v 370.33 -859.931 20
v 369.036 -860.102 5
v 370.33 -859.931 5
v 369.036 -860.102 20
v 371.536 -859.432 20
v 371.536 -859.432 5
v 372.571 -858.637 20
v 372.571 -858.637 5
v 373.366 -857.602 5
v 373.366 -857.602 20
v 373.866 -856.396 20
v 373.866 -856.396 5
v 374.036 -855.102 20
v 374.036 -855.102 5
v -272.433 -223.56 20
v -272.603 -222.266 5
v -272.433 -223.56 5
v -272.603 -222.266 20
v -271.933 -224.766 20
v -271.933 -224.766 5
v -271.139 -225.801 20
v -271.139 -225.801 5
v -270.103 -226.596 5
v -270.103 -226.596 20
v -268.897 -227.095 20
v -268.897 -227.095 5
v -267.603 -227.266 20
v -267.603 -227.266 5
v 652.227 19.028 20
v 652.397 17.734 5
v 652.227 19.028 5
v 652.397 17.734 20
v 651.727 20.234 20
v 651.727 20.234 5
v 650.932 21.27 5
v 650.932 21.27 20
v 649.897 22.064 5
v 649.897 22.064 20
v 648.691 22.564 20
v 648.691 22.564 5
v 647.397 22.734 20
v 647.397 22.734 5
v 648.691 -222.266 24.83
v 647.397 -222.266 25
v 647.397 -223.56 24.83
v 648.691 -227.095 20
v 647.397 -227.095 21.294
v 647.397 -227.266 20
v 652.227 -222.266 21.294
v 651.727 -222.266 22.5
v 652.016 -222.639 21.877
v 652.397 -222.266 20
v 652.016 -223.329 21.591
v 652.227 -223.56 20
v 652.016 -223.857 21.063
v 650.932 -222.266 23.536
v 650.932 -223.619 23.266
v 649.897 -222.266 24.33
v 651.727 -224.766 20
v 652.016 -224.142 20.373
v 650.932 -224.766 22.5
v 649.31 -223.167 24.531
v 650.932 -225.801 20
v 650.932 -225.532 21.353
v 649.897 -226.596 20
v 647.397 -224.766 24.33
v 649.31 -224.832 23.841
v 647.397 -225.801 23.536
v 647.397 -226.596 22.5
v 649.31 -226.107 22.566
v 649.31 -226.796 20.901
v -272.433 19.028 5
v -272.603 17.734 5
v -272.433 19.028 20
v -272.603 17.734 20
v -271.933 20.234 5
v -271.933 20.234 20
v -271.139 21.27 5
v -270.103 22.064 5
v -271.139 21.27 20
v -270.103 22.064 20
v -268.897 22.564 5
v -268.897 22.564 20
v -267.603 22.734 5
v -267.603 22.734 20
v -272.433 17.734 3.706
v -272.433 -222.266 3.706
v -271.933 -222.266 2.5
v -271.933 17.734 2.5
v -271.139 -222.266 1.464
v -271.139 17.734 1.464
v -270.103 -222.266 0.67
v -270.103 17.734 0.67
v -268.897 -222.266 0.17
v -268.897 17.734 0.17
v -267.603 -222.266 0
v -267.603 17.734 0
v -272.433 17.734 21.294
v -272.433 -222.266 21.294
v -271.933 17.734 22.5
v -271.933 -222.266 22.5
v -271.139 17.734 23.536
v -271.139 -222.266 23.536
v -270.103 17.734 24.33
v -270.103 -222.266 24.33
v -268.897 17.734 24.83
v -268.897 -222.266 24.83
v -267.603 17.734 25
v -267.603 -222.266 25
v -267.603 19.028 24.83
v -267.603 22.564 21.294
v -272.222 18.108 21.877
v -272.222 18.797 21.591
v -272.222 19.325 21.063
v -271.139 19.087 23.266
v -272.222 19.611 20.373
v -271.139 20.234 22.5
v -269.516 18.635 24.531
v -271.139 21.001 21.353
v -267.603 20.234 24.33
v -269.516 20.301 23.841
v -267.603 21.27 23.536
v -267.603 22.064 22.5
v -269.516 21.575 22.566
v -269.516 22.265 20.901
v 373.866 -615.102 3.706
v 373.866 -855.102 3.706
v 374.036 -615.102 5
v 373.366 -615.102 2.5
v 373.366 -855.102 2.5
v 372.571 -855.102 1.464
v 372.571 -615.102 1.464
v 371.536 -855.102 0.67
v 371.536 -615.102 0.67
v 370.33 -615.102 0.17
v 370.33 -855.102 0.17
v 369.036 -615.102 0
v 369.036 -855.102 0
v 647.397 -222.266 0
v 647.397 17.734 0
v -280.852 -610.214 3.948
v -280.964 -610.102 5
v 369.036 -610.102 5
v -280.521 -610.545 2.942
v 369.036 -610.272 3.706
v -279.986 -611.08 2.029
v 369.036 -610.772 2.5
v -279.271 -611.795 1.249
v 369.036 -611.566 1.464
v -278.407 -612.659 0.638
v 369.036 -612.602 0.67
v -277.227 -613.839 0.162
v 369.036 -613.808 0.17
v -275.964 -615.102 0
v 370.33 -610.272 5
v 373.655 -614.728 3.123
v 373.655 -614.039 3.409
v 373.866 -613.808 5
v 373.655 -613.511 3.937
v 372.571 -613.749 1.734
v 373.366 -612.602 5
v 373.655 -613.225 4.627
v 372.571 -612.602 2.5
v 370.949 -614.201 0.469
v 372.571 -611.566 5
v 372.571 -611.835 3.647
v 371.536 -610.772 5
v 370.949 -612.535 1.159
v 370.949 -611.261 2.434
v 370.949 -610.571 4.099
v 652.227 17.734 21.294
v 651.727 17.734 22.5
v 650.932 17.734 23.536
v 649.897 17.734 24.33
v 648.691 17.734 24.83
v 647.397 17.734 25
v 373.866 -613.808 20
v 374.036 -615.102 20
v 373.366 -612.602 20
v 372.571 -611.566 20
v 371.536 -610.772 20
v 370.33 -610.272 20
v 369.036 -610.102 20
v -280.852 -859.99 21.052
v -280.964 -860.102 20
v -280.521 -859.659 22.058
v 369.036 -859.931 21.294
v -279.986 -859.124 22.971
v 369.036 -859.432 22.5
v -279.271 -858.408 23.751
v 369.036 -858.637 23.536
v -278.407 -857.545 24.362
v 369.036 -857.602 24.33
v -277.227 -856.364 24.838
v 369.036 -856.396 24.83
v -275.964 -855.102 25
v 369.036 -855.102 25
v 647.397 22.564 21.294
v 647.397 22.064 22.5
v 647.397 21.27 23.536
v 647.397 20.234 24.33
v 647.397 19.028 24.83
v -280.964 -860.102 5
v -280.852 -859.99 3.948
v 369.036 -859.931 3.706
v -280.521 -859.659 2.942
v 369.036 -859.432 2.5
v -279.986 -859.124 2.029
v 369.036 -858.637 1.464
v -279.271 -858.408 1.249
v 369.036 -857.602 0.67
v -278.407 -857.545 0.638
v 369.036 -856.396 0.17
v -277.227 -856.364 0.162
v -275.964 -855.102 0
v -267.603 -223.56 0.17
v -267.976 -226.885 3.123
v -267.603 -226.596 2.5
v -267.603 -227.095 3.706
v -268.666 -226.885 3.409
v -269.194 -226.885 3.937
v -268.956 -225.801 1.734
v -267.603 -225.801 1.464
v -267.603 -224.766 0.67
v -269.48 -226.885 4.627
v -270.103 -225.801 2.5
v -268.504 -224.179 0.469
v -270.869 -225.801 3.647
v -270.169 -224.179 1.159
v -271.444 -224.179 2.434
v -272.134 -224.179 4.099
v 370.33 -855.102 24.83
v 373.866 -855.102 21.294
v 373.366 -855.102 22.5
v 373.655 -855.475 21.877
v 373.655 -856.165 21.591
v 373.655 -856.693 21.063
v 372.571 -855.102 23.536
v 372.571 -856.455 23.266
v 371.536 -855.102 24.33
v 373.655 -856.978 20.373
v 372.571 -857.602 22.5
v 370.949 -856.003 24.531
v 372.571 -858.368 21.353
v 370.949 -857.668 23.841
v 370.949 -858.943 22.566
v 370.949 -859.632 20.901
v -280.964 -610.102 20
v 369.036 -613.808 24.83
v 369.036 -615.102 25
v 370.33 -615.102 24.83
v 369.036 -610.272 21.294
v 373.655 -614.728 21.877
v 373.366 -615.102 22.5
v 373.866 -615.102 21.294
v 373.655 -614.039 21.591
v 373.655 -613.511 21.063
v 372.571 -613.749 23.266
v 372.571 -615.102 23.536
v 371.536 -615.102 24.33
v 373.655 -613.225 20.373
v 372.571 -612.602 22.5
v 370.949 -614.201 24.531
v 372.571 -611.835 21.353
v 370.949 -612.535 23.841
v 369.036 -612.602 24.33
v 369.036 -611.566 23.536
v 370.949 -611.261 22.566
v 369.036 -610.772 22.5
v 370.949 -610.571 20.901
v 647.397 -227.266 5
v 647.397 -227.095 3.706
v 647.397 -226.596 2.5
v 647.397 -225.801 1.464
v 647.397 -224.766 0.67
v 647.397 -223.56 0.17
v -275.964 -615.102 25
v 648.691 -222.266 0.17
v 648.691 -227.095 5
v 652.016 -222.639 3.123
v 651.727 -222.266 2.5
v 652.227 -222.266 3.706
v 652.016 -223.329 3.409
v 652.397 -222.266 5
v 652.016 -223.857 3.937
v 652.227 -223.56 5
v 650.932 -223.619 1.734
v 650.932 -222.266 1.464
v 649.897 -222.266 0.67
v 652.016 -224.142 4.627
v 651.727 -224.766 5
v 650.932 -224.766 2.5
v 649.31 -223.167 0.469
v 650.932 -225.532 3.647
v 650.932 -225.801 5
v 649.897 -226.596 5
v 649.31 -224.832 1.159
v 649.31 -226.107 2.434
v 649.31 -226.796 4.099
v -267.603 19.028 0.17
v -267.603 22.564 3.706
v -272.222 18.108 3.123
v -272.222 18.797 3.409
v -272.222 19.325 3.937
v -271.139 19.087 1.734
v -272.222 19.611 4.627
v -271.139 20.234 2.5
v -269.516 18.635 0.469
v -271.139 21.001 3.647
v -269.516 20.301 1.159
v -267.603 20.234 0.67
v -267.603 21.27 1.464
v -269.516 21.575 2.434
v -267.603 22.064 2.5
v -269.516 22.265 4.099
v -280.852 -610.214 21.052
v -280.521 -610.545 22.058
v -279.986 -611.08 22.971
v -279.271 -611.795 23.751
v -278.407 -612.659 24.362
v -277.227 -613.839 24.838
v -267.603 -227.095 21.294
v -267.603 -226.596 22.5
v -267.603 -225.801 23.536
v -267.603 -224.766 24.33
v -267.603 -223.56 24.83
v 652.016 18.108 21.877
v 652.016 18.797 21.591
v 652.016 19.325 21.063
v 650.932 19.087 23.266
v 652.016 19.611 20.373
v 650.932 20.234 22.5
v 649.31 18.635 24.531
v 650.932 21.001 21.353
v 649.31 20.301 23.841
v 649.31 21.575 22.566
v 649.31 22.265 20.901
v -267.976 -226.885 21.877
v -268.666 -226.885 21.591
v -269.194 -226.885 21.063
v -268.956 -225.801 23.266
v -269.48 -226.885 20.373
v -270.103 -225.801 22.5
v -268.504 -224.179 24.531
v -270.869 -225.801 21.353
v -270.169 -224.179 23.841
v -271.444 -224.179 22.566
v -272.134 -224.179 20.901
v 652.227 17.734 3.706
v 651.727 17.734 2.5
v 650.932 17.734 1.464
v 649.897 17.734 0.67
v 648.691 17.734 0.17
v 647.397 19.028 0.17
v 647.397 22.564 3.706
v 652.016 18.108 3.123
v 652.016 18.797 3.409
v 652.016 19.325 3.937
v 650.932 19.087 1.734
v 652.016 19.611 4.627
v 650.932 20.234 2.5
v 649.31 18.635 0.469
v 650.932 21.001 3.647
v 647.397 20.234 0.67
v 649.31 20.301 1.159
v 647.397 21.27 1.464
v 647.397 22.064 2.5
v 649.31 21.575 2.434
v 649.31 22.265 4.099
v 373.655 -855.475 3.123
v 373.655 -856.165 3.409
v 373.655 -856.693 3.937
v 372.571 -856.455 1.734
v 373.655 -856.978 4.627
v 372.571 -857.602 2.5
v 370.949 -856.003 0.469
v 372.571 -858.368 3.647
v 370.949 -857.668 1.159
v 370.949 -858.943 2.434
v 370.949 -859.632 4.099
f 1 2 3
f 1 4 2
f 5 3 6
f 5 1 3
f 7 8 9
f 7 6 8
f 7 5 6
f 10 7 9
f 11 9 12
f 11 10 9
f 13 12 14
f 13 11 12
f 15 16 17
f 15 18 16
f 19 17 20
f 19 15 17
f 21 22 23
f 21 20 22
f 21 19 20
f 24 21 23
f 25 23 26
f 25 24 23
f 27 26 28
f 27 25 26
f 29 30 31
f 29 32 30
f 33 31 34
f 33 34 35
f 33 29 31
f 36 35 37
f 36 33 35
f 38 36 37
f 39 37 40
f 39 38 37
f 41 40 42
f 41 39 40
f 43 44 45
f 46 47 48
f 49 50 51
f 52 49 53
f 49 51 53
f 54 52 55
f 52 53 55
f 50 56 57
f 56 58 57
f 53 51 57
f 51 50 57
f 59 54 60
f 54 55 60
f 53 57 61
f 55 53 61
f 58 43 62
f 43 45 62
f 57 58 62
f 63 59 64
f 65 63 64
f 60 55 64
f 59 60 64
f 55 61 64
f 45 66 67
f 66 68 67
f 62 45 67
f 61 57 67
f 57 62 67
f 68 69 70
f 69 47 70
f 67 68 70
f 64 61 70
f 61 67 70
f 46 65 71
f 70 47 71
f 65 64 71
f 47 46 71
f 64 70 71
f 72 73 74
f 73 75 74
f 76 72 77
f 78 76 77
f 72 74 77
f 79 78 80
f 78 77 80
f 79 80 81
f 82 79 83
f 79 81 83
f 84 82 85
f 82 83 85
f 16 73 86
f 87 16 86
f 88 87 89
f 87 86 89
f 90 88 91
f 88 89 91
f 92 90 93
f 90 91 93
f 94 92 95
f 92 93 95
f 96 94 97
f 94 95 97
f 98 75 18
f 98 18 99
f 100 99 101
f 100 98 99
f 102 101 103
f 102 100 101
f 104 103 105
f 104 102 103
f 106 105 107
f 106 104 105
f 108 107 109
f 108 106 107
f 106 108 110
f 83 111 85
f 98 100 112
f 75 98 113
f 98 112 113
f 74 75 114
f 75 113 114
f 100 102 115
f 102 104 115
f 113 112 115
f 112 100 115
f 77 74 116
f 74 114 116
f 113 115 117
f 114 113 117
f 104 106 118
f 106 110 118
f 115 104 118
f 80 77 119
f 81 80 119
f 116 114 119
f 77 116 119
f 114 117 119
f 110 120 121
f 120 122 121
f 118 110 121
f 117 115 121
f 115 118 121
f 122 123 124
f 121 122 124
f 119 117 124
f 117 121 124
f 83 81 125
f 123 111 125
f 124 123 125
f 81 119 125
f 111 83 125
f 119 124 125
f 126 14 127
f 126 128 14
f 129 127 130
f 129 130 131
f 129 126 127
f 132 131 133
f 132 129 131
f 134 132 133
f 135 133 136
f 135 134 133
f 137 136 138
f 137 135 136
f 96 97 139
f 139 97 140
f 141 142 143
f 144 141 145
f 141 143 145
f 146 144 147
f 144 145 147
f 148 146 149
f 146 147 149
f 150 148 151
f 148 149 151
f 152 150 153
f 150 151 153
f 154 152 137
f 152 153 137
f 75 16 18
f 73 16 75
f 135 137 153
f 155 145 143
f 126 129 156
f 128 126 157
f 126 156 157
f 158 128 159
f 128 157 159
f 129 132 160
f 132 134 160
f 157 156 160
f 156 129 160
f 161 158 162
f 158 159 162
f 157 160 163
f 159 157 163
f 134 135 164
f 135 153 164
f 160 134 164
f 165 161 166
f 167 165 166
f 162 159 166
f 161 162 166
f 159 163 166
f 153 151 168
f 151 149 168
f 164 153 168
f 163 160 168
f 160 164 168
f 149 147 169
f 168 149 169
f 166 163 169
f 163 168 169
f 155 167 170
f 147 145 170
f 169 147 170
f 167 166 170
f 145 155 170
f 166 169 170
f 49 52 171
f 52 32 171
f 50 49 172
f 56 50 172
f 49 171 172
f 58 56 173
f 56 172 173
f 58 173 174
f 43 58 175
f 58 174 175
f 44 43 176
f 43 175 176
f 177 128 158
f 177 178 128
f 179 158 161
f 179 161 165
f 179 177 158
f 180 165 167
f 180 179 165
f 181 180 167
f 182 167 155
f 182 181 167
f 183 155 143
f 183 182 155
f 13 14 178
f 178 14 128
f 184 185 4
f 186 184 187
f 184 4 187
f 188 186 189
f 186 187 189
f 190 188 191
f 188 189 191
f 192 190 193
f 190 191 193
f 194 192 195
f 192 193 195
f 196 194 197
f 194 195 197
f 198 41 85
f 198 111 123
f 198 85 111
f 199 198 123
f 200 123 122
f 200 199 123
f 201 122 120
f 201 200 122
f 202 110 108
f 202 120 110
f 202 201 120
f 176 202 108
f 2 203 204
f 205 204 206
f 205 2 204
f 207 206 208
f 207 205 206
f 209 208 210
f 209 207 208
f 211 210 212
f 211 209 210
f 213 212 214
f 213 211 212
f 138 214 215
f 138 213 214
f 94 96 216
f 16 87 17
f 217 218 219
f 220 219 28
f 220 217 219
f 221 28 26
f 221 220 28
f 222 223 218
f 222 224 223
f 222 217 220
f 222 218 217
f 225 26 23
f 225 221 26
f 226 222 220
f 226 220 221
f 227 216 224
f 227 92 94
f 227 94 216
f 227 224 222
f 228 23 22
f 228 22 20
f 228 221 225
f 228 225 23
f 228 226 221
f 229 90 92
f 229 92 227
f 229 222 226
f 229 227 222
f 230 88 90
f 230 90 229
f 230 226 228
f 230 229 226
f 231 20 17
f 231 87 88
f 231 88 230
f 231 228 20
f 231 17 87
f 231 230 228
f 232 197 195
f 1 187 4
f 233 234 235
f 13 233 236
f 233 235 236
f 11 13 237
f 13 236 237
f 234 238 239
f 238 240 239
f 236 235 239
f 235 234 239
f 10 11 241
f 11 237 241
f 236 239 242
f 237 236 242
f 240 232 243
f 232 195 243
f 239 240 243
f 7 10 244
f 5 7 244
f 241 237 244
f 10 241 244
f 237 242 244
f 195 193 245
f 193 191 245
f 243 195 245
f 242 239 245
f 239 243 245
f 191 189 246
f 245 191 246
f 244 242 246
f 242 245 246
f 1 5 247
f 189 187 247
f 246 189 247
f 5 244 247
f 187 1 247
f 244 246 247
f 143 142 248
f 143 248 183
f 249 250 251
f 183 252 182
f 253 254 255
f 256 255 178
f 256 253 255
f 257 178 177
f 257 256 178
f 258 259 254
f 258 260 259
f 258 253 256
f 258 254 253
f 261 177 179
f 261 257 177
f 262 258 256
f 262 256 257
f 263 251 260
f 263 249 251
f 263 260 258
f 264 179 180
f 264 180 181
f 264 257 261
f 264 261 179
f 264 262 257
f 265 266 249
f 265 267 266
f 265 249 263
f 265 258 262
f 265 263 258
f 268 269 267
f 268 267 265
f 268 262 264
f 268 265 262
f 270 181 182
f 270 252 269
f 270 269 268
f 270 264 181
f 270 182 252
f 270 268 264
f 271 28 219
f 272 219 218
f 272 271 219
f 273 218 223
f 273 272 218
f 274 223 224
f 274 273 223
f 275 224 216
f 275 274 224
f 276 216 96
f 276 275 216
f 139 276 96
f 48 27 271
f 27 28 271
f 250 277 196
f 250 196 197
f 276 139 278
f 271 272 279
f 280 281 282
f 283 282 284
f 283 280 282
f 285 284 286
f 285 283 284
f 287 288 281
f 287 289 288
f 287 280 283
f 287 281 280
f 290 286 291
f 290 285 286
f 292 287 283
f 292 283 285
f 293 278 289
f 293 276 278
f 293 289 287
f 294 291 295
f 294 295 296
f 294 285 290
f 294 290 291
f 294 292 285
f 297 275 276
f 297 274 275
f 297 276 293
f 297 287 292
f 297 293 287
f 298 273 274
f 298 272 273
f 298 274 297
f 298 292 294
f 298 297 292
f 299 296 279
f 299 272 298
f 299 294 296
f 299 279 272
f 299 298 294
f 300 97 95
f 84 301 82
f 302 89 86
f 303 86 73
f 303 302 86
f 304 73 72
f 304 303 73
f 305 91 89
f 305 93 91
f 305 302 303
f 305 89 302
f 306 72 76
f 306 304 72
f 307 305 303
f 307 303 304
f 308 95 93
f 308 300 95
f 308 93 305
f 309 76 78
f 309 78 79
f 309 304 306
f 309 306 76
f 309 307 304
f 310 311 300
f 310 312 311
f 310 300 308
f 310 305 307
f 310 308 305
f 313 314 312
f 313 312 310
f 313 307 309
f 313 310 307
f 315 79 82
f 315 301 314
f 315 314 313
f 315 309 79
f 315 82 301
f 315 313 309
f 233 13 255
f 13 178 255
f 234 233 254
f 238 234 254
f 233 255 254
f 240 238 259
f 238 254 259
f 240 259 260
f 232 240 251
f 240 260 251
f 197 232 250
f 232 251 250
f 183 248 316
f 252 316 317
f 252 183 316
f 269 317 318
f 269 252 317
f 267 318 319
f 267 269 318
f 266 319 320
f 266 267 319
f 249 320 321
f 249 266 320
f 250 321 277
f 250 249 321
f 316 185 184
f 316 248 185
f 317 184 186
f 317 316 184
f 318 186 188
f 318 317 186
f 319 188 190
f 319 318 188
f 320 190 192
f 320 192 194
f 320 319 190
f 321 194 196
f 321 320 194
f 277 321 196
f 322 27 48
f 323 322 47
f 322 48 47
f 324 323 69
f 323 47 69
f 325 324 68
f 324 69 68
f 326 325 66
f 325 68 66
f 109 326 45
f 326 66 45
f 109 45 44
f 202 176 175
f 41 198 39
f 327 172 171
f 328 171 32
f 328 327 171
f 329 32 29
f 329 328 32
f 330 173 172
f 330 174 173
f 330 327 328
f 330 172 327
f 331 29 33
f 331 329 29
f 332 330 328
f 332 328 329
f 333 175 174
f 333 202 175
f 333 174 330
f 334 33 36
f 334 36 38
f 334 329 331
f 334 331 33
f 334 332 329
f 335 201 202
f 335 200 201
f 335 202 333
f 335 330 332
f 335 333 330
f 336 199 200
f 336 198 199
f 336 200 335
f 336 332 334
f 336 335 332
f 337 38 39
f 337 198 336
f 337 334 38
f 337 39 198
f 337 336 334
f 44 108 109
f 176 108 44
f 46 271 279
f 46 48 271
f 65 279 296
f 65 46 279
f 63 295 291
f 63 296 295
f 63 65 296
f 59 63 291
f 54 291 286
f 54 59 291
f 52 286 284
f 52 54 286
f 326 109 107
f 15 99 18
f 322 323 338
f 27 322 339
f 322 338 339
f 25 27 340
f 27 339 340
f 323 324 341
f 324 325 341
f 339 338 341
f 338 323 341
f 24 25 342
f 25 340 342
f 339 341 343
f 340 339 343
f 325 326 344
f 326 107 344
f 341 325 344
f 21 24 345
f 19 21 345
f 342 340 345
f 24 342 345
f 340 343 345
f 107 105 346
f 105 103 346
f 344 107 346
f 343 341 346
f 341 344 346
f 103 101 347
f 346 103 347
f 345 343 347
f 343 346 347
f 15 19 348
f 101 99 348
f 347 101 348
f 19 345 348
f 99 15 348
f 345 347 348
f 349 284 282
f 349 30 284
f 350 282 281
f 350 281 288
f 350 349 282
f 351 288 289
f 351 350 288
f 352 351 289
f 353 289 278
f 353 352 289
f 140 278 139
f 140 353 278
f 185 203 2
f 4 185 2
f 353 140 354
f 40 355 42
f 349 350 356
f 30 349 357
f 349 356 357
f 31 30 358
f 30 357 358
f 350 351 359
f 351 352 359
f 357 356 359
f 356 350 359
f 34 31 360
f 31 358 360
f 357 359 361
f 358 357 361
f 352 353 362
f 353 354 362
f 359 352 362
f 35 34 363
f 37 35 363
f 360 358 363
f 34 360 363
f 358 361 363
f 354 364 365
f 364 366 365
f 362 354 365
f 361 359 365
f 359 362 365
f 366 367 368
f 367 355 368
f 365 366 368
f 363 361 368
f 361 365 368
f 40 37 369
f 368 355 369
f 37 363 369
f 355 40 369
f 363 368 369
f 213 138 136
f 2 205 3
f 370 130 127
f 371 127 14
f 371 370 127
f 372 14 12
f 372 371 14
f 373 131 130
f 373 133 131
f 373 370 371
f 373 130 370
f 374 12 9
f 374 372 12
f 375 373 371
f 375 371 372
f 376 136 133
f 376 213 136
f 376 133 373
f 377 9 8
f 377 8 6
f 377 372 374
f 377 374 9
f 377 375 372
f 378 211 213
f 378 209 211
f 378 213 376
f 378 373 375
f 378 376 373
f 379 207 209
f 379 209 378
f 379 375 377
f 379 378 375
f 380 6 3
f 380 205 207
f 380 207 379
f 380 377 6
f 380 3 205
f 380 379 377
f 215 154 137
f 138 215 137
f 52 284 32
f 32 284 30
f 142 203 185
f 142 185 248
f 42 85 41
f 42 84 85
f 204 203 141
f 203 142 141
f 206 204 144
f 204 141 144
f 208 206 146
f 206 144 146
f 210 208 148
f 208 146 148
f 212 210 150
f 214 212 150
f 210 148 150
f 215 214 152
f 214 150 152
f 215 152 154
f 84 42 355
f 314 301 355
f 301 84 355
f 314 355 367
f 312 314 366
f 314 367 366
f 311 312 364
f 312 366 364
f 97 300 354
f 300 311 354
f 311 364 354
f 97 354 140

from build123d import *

# Parameters (mm, degrees)
F0_W     = 655
F0_H     = 250
F1_DEPTH = 25
F3_DEPTH = 250.001
F4_R     = 5
F5_W     = 925
F5_H     = 250
F6_DEPTH = 25
F7_R     = 5


with BuildPart() as f1:
    # F0 (on Top) → F1 (new body)
    with BuildSketch(Plane.XY):
        with Locations((46.5359067917, -735.1017089717)):
            Rectangle(F0_W, F0_H)
    extrude(amount=F1_DEPTH)

    # F2 (on face) → F3 (cut, through all)
    with BuildSketch(Plane.XZ.offset(860.1017089717)):
        Polygon((-329.5351266861, 5.0213485956), (-321.2029933929, 5.0213038921), (-293.8260436058, 27.9015563428), (-329.5351266861, 27.9015563428), align=None)
    extrude(amount=-F3_DEPTH, mode=Mode.SUBTRACT)

    # F4
    f4_edges = [f1.edges().sort_by_distance(p)[0] for p in [
        (46.535907, -610.101709, 25),
        (-280.964093, -735.101709, 25),
        (46.535907, -860.101709, 25),
        (374.035907, -735.101709, 25),
        (46.535907, -610.101709, 0),
        (-280.964093, -735.101709, 0),
        (46.535907, -860.101709, 0),
        (374.035907, -735.101709, 0),
        (374.035907, -860.101709, 12.5),
        (374.035907, -610.101709, 12.5),
    ]]
    fillet(f4_edges, radius=F4_R)


with BuildPart() as f6:
    # F5 (on Top) → F6 (new body)
    with BuildSketch(Plane.XY):
        with Locations((189.8969432941, -102.2657254338)):
            Rectangle(F5_W, F5_H)
    extrude(amount=F6_DEPTH)

    # F7
    f7_edges = [f6.edges().sort_by_distance(p)[0] for p in [
        (189.896943, 22.734275, 25),
        (-272.603057, -102.265725, 25),
        (189.896943, -227.265725, 25),
        (652.396943, -102.265725, 25),
        (189.896943, 22.734275, 0),
        (-272.603057, -102.265725, 0),
        (189.896943, -227.265725, 0),
        (652.396943, -102.265725, 0),
        (652.396943, 22.734275, 12.5),
        (-272.603057, 22.734275, 12.5),
        (-272.603057, -227.265725, 12.5),
        (652.396943, -227.265725, 12.5),
    ]]
    fillet(f7_edges, radius=F7_R)


solid = Compound([f1.part, f6.part])
